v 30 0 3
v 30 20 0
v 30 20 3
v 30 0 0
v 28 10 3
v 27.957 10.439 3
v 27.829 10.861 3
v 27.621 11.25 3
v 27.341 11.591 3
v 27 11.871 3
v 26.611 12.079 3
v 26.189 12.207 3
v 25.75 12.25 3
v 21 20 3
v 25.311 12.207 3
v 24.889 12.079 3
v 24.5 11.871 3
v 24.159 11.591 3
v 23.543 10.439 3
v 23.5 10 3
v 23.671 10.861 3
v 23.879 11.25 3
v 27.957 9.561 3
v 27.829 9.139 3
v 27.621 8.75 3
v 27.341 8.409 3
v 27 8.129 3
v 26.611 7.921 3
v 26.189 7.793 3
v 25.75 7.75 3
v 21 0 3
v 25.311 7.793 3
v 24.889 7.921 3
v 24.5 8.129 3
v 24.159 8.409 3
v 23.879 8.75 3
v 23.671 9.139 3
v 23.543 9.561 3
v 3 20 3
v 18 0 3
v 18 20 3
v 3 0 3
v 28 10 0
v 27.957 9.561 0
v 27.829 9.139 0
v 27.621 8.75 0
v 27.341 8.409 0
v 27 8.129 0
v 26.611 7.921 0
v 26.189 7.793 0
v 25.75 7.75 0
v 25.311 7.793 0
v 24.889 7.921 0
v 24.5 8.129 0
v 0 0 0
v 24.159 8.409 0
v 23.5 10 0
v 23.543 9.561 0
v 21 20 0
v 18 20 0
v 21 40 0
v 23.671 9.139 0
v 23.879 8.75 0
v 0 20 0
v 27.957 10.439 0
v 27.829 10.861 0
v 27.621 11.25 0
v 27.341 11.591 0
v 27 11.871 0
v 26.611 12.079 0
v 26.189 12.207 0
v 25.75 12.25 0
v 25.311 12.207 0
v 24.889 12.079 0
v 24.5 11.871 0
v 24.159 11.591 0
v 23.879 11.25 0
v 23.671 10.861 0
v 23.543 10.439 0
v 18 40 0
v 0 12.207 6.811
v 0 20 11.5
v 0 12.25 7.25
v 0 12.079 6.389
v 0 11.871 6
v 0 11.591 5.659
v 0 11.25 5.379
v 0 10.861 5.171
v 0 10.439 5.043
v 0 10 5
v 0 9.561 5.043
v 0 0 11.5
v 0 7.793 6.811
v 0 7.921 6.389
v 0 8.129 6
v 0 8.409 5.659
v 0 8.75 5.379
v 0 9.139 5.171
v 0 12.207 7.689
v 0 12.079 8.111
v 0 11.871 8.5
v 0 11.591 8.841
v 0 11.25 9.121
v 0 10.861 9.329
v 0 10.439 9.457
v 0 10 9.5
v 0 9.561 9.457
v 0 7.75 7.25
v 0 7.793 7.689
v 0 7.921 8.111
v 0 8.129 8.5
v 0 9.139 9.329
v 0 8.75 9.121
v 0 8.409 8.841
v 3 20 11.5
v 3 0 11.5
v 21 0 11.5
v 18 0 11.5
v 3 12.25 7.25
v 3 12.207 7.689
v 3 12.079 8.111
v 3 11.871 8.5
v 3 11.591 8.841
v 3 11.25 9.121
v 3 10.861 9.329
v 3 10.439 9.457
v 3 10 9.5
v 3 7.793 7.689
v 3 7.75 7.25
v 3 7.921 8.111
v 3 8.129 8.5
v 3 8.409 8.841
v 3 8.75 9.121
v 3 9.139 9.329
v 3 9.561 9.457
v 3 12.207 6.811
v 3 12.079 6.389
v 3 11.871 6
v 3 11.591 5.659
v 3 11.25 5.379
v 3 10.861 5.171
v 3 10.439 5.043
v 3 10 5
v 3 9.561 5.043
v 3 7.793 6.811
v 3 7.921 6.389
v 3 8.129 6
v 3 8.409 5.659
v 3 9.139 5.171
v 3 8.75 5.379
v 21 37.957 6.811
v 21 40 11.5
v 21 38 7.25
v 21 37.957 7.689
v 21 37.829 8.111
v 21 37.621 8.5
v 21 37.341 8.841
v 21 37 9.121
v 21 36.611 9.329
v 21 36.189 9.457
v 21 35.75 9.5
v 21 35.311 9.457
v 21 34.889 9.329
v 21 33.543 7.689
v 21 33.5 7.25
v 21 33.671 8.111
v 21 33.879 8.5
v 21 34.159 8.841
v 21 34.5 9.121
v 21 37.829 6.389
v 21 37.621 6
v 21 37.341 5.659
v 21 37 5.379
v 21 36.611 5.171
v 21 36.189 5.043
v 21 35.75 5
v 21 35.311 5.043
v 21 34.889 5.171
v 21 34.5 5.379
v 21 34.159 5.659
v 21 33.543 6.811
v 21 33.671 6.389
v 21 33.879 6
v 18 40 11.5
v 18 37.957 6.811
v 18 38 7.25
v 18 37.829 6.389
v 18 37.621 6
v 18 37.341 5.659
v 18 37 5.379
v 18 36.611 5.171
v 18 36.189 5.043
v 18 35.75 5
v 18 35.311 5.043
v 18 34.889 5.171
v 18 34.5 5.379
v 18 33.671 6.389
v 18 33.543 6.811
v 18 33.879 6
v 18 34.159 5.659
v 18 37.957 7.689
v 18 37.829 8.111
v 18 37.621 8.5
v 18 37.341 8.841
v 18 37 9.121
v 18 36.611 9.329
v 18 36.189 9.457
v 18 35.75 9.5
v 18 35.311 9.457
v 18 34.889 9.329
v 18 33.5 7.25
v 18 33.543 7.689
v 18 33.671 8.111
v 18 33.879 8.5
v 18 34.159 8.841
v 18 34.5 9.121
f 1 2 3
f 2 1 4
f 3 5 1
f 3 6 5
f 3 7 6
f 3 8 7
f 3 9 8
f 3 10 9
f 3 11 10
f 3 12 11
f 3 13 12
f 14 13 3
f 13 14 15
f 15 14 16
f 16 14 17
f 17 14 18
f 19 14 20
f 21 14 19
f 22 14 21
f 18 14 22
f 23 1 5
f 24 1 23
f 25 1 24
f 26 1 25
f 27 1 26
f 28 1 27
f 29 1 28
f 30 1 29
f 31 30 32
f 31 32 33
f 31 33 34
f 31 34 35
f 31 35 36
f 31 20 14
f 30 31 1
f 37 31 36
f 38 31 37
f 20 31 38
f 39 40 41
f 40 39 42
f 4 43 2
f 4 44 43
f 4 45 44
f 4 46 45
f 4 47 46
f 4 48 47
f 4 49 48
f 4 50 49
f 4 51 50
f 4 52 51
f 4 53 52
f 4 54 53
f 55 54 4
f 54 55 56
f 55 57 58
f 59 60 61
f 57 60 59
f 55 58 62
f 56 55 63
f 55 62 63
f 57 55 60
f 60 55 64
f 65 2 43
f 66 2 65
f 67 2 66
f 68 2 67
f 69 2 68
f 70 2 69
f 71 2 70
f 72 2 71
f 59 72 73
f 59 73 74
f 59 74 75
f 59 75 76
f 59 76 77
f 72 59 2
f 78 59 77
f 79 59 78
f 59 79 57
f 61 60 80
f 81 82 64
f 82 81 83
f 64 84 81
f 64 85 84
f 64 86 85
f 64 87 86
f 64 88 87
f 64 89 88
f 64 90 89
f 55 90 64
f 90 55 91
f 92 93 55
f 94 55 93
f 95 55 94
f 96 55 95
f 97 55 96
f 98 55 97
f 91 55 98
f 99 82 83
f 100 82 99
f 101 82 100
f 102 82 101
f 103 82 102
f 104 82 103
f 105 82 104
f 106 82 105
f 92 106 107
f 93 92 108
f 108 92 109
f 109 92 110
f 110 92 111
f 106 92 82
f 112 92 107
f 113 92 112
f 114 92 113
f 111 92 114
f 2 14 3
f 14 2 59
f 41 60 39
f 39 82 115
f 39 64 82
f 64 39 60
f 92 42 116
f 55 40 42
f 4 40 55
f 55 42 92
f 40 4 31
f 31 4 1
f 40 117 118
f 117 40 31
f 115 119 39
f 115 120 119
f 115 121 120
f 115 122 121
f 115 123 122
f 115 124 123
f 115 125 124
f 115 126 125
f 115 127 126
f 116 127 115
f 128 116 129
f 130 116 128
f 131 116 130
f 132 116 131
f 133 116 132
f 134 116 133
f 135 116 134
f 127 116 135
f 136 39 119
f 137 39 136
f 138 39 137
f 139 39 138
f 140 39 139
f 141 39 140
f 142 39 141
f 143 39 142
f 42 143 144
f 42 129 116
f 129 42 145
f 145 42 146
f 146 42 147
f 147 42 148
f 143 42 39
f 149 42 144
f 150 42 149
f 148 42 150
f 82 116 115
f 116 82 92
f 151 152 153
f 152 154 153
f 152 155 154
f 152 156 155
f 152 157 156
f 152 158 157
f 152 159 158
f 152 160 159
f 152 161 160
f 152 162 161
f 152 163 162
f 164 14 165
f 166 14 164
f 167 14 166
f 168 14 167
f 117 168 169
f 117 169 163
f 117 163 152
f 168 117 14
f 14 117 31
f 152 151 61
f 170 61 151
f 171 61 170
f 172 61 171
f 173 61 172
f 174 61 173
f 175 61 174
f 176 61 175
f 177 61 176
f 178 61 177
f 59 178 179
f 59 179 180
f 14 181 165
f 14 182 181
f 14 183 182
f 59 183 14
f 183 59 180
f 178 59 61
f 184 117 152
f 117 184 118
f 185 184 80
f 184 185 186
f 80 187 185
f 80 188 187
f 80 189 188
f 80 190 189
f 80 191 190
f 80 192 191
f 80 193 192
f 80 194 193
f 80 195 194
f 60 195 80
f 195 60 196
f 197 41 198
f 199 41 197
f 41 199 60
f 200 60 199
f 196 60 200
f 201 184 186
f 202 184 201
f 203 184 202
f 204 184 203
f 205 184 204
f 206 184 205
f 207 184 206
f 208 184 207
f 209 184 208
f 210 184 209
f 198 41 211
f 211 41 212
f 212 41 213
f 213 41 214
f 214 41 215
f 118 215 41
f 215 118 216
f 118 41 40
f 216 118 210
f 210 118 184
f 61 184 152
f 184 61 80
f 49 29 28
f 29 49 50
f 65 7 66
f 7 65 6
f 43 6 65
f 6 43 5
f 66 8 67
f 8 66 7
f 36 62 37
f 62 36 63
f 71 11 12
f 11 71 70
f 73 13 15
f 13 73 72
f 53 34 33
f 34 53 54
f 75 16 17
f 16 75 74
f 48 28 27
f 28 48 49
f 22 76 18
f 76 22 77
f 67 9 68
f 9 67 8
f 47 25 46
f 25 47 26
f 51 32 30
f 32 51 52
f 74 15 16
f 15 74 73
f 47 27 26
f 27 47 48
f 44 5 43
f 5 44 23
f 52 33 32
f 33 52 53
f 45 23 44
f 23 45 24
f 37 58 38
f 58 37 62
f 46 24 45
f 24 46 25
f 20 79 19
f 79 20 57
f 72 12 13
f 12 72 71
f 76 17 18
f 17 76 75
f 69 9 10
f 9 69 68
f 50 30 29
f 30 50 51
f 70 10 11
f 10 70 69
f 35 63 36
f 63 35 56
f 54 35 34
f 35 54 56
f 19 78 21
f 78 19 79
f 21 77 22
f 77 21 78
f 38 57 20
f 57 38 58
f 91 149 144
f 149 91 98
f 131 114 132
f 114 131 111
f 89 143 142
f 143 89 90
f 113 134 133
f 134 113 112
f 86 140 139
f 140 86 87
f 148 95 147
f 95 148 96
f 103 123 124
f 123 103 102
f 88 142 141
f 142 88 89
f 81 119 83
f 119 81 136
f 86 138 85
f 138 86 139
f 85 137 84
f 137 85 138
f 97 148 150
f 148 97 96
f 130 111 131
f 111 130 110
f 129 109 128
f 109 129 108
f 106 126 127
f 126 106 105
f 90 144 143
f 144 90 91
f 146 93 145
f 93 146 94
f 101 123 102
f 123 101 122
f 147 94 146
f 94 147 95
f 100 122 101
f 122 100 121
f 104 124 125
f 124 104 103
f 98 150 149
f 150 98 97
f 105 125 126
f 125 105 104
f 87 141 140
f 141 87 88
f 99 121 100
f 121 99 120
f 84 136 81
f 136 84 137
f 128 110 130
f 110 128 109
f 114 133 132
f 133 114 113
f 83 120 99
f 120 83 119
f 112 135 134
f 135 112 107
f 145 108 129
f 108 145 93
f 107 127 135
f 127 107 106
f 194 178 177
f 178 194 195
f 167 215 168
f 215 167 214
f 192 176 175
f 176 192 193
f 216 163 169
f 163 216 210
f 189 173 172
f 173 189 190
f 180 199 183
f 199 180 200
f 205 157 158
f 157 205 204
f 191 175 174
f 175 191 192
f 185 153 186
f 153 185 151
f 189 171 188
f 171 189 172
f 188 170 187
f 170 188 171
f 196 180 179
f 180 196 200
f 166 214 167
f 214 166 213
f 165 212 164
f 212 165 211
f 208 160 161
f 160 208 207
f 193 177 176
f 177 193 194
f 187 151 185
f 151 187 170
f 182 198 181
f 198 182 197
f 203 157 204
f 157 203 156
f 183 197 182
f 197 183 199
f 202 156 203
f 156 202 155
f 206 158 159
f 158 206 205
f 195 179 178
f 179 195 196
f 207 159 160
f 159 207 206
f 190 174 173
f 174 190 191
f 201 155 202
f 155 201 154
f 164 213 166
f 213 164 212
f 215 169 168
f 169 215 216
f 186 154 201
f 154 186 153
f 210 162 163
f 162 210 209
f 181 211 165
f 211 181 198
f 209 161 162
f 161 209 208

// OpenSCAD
$fn=32;

module front_holder()
{
    screwhole_diameter = 4.5;
    screw_padding = 2;
    height = 30;
    depth=20;
    control_holder_depth = 40;
    control_holder_offset = 18;
    thickness=3;
    top_width = screw_padding*2+screwhole_diameter+thickness;

    difference()
    {
        union () 
        {
            //Vertical plate
            cube ([height, depth, thickness]);

            //Top holding part
            cube ([thickness, depth,top_width]);

            //Control horn holder
            translate([control_holder_offset, 0, 0])
            cube ([thickness, control_holder_depth, top_width]);
        }

        //Wheel hole
        translate([height - screw_padding - screwhole_diameter/2, depth/2, -1])
        cylinder (h=thickness+2, d=screwhole_diameter);

        //Mounting hole
        translate([-1, depth/2, top_width - screwhole_diameter/2-screw_padding])
        rotate(90, [0,1,0])
        cylinder (h=thickness+2, d=screwhole_diameter);

        //Control hole
        translate([
                -1 + control_holder_offset, 
                control_holder_depth - screw_padding -screwhole_diameter / 2, 
                top_width - screwhole_diameter/2-screw_padding
            ])
        rotate(90, [0,1,0])
        cylinder (h=thickness+2, d=screwhole_diameter);
    }
}

front_holder();
